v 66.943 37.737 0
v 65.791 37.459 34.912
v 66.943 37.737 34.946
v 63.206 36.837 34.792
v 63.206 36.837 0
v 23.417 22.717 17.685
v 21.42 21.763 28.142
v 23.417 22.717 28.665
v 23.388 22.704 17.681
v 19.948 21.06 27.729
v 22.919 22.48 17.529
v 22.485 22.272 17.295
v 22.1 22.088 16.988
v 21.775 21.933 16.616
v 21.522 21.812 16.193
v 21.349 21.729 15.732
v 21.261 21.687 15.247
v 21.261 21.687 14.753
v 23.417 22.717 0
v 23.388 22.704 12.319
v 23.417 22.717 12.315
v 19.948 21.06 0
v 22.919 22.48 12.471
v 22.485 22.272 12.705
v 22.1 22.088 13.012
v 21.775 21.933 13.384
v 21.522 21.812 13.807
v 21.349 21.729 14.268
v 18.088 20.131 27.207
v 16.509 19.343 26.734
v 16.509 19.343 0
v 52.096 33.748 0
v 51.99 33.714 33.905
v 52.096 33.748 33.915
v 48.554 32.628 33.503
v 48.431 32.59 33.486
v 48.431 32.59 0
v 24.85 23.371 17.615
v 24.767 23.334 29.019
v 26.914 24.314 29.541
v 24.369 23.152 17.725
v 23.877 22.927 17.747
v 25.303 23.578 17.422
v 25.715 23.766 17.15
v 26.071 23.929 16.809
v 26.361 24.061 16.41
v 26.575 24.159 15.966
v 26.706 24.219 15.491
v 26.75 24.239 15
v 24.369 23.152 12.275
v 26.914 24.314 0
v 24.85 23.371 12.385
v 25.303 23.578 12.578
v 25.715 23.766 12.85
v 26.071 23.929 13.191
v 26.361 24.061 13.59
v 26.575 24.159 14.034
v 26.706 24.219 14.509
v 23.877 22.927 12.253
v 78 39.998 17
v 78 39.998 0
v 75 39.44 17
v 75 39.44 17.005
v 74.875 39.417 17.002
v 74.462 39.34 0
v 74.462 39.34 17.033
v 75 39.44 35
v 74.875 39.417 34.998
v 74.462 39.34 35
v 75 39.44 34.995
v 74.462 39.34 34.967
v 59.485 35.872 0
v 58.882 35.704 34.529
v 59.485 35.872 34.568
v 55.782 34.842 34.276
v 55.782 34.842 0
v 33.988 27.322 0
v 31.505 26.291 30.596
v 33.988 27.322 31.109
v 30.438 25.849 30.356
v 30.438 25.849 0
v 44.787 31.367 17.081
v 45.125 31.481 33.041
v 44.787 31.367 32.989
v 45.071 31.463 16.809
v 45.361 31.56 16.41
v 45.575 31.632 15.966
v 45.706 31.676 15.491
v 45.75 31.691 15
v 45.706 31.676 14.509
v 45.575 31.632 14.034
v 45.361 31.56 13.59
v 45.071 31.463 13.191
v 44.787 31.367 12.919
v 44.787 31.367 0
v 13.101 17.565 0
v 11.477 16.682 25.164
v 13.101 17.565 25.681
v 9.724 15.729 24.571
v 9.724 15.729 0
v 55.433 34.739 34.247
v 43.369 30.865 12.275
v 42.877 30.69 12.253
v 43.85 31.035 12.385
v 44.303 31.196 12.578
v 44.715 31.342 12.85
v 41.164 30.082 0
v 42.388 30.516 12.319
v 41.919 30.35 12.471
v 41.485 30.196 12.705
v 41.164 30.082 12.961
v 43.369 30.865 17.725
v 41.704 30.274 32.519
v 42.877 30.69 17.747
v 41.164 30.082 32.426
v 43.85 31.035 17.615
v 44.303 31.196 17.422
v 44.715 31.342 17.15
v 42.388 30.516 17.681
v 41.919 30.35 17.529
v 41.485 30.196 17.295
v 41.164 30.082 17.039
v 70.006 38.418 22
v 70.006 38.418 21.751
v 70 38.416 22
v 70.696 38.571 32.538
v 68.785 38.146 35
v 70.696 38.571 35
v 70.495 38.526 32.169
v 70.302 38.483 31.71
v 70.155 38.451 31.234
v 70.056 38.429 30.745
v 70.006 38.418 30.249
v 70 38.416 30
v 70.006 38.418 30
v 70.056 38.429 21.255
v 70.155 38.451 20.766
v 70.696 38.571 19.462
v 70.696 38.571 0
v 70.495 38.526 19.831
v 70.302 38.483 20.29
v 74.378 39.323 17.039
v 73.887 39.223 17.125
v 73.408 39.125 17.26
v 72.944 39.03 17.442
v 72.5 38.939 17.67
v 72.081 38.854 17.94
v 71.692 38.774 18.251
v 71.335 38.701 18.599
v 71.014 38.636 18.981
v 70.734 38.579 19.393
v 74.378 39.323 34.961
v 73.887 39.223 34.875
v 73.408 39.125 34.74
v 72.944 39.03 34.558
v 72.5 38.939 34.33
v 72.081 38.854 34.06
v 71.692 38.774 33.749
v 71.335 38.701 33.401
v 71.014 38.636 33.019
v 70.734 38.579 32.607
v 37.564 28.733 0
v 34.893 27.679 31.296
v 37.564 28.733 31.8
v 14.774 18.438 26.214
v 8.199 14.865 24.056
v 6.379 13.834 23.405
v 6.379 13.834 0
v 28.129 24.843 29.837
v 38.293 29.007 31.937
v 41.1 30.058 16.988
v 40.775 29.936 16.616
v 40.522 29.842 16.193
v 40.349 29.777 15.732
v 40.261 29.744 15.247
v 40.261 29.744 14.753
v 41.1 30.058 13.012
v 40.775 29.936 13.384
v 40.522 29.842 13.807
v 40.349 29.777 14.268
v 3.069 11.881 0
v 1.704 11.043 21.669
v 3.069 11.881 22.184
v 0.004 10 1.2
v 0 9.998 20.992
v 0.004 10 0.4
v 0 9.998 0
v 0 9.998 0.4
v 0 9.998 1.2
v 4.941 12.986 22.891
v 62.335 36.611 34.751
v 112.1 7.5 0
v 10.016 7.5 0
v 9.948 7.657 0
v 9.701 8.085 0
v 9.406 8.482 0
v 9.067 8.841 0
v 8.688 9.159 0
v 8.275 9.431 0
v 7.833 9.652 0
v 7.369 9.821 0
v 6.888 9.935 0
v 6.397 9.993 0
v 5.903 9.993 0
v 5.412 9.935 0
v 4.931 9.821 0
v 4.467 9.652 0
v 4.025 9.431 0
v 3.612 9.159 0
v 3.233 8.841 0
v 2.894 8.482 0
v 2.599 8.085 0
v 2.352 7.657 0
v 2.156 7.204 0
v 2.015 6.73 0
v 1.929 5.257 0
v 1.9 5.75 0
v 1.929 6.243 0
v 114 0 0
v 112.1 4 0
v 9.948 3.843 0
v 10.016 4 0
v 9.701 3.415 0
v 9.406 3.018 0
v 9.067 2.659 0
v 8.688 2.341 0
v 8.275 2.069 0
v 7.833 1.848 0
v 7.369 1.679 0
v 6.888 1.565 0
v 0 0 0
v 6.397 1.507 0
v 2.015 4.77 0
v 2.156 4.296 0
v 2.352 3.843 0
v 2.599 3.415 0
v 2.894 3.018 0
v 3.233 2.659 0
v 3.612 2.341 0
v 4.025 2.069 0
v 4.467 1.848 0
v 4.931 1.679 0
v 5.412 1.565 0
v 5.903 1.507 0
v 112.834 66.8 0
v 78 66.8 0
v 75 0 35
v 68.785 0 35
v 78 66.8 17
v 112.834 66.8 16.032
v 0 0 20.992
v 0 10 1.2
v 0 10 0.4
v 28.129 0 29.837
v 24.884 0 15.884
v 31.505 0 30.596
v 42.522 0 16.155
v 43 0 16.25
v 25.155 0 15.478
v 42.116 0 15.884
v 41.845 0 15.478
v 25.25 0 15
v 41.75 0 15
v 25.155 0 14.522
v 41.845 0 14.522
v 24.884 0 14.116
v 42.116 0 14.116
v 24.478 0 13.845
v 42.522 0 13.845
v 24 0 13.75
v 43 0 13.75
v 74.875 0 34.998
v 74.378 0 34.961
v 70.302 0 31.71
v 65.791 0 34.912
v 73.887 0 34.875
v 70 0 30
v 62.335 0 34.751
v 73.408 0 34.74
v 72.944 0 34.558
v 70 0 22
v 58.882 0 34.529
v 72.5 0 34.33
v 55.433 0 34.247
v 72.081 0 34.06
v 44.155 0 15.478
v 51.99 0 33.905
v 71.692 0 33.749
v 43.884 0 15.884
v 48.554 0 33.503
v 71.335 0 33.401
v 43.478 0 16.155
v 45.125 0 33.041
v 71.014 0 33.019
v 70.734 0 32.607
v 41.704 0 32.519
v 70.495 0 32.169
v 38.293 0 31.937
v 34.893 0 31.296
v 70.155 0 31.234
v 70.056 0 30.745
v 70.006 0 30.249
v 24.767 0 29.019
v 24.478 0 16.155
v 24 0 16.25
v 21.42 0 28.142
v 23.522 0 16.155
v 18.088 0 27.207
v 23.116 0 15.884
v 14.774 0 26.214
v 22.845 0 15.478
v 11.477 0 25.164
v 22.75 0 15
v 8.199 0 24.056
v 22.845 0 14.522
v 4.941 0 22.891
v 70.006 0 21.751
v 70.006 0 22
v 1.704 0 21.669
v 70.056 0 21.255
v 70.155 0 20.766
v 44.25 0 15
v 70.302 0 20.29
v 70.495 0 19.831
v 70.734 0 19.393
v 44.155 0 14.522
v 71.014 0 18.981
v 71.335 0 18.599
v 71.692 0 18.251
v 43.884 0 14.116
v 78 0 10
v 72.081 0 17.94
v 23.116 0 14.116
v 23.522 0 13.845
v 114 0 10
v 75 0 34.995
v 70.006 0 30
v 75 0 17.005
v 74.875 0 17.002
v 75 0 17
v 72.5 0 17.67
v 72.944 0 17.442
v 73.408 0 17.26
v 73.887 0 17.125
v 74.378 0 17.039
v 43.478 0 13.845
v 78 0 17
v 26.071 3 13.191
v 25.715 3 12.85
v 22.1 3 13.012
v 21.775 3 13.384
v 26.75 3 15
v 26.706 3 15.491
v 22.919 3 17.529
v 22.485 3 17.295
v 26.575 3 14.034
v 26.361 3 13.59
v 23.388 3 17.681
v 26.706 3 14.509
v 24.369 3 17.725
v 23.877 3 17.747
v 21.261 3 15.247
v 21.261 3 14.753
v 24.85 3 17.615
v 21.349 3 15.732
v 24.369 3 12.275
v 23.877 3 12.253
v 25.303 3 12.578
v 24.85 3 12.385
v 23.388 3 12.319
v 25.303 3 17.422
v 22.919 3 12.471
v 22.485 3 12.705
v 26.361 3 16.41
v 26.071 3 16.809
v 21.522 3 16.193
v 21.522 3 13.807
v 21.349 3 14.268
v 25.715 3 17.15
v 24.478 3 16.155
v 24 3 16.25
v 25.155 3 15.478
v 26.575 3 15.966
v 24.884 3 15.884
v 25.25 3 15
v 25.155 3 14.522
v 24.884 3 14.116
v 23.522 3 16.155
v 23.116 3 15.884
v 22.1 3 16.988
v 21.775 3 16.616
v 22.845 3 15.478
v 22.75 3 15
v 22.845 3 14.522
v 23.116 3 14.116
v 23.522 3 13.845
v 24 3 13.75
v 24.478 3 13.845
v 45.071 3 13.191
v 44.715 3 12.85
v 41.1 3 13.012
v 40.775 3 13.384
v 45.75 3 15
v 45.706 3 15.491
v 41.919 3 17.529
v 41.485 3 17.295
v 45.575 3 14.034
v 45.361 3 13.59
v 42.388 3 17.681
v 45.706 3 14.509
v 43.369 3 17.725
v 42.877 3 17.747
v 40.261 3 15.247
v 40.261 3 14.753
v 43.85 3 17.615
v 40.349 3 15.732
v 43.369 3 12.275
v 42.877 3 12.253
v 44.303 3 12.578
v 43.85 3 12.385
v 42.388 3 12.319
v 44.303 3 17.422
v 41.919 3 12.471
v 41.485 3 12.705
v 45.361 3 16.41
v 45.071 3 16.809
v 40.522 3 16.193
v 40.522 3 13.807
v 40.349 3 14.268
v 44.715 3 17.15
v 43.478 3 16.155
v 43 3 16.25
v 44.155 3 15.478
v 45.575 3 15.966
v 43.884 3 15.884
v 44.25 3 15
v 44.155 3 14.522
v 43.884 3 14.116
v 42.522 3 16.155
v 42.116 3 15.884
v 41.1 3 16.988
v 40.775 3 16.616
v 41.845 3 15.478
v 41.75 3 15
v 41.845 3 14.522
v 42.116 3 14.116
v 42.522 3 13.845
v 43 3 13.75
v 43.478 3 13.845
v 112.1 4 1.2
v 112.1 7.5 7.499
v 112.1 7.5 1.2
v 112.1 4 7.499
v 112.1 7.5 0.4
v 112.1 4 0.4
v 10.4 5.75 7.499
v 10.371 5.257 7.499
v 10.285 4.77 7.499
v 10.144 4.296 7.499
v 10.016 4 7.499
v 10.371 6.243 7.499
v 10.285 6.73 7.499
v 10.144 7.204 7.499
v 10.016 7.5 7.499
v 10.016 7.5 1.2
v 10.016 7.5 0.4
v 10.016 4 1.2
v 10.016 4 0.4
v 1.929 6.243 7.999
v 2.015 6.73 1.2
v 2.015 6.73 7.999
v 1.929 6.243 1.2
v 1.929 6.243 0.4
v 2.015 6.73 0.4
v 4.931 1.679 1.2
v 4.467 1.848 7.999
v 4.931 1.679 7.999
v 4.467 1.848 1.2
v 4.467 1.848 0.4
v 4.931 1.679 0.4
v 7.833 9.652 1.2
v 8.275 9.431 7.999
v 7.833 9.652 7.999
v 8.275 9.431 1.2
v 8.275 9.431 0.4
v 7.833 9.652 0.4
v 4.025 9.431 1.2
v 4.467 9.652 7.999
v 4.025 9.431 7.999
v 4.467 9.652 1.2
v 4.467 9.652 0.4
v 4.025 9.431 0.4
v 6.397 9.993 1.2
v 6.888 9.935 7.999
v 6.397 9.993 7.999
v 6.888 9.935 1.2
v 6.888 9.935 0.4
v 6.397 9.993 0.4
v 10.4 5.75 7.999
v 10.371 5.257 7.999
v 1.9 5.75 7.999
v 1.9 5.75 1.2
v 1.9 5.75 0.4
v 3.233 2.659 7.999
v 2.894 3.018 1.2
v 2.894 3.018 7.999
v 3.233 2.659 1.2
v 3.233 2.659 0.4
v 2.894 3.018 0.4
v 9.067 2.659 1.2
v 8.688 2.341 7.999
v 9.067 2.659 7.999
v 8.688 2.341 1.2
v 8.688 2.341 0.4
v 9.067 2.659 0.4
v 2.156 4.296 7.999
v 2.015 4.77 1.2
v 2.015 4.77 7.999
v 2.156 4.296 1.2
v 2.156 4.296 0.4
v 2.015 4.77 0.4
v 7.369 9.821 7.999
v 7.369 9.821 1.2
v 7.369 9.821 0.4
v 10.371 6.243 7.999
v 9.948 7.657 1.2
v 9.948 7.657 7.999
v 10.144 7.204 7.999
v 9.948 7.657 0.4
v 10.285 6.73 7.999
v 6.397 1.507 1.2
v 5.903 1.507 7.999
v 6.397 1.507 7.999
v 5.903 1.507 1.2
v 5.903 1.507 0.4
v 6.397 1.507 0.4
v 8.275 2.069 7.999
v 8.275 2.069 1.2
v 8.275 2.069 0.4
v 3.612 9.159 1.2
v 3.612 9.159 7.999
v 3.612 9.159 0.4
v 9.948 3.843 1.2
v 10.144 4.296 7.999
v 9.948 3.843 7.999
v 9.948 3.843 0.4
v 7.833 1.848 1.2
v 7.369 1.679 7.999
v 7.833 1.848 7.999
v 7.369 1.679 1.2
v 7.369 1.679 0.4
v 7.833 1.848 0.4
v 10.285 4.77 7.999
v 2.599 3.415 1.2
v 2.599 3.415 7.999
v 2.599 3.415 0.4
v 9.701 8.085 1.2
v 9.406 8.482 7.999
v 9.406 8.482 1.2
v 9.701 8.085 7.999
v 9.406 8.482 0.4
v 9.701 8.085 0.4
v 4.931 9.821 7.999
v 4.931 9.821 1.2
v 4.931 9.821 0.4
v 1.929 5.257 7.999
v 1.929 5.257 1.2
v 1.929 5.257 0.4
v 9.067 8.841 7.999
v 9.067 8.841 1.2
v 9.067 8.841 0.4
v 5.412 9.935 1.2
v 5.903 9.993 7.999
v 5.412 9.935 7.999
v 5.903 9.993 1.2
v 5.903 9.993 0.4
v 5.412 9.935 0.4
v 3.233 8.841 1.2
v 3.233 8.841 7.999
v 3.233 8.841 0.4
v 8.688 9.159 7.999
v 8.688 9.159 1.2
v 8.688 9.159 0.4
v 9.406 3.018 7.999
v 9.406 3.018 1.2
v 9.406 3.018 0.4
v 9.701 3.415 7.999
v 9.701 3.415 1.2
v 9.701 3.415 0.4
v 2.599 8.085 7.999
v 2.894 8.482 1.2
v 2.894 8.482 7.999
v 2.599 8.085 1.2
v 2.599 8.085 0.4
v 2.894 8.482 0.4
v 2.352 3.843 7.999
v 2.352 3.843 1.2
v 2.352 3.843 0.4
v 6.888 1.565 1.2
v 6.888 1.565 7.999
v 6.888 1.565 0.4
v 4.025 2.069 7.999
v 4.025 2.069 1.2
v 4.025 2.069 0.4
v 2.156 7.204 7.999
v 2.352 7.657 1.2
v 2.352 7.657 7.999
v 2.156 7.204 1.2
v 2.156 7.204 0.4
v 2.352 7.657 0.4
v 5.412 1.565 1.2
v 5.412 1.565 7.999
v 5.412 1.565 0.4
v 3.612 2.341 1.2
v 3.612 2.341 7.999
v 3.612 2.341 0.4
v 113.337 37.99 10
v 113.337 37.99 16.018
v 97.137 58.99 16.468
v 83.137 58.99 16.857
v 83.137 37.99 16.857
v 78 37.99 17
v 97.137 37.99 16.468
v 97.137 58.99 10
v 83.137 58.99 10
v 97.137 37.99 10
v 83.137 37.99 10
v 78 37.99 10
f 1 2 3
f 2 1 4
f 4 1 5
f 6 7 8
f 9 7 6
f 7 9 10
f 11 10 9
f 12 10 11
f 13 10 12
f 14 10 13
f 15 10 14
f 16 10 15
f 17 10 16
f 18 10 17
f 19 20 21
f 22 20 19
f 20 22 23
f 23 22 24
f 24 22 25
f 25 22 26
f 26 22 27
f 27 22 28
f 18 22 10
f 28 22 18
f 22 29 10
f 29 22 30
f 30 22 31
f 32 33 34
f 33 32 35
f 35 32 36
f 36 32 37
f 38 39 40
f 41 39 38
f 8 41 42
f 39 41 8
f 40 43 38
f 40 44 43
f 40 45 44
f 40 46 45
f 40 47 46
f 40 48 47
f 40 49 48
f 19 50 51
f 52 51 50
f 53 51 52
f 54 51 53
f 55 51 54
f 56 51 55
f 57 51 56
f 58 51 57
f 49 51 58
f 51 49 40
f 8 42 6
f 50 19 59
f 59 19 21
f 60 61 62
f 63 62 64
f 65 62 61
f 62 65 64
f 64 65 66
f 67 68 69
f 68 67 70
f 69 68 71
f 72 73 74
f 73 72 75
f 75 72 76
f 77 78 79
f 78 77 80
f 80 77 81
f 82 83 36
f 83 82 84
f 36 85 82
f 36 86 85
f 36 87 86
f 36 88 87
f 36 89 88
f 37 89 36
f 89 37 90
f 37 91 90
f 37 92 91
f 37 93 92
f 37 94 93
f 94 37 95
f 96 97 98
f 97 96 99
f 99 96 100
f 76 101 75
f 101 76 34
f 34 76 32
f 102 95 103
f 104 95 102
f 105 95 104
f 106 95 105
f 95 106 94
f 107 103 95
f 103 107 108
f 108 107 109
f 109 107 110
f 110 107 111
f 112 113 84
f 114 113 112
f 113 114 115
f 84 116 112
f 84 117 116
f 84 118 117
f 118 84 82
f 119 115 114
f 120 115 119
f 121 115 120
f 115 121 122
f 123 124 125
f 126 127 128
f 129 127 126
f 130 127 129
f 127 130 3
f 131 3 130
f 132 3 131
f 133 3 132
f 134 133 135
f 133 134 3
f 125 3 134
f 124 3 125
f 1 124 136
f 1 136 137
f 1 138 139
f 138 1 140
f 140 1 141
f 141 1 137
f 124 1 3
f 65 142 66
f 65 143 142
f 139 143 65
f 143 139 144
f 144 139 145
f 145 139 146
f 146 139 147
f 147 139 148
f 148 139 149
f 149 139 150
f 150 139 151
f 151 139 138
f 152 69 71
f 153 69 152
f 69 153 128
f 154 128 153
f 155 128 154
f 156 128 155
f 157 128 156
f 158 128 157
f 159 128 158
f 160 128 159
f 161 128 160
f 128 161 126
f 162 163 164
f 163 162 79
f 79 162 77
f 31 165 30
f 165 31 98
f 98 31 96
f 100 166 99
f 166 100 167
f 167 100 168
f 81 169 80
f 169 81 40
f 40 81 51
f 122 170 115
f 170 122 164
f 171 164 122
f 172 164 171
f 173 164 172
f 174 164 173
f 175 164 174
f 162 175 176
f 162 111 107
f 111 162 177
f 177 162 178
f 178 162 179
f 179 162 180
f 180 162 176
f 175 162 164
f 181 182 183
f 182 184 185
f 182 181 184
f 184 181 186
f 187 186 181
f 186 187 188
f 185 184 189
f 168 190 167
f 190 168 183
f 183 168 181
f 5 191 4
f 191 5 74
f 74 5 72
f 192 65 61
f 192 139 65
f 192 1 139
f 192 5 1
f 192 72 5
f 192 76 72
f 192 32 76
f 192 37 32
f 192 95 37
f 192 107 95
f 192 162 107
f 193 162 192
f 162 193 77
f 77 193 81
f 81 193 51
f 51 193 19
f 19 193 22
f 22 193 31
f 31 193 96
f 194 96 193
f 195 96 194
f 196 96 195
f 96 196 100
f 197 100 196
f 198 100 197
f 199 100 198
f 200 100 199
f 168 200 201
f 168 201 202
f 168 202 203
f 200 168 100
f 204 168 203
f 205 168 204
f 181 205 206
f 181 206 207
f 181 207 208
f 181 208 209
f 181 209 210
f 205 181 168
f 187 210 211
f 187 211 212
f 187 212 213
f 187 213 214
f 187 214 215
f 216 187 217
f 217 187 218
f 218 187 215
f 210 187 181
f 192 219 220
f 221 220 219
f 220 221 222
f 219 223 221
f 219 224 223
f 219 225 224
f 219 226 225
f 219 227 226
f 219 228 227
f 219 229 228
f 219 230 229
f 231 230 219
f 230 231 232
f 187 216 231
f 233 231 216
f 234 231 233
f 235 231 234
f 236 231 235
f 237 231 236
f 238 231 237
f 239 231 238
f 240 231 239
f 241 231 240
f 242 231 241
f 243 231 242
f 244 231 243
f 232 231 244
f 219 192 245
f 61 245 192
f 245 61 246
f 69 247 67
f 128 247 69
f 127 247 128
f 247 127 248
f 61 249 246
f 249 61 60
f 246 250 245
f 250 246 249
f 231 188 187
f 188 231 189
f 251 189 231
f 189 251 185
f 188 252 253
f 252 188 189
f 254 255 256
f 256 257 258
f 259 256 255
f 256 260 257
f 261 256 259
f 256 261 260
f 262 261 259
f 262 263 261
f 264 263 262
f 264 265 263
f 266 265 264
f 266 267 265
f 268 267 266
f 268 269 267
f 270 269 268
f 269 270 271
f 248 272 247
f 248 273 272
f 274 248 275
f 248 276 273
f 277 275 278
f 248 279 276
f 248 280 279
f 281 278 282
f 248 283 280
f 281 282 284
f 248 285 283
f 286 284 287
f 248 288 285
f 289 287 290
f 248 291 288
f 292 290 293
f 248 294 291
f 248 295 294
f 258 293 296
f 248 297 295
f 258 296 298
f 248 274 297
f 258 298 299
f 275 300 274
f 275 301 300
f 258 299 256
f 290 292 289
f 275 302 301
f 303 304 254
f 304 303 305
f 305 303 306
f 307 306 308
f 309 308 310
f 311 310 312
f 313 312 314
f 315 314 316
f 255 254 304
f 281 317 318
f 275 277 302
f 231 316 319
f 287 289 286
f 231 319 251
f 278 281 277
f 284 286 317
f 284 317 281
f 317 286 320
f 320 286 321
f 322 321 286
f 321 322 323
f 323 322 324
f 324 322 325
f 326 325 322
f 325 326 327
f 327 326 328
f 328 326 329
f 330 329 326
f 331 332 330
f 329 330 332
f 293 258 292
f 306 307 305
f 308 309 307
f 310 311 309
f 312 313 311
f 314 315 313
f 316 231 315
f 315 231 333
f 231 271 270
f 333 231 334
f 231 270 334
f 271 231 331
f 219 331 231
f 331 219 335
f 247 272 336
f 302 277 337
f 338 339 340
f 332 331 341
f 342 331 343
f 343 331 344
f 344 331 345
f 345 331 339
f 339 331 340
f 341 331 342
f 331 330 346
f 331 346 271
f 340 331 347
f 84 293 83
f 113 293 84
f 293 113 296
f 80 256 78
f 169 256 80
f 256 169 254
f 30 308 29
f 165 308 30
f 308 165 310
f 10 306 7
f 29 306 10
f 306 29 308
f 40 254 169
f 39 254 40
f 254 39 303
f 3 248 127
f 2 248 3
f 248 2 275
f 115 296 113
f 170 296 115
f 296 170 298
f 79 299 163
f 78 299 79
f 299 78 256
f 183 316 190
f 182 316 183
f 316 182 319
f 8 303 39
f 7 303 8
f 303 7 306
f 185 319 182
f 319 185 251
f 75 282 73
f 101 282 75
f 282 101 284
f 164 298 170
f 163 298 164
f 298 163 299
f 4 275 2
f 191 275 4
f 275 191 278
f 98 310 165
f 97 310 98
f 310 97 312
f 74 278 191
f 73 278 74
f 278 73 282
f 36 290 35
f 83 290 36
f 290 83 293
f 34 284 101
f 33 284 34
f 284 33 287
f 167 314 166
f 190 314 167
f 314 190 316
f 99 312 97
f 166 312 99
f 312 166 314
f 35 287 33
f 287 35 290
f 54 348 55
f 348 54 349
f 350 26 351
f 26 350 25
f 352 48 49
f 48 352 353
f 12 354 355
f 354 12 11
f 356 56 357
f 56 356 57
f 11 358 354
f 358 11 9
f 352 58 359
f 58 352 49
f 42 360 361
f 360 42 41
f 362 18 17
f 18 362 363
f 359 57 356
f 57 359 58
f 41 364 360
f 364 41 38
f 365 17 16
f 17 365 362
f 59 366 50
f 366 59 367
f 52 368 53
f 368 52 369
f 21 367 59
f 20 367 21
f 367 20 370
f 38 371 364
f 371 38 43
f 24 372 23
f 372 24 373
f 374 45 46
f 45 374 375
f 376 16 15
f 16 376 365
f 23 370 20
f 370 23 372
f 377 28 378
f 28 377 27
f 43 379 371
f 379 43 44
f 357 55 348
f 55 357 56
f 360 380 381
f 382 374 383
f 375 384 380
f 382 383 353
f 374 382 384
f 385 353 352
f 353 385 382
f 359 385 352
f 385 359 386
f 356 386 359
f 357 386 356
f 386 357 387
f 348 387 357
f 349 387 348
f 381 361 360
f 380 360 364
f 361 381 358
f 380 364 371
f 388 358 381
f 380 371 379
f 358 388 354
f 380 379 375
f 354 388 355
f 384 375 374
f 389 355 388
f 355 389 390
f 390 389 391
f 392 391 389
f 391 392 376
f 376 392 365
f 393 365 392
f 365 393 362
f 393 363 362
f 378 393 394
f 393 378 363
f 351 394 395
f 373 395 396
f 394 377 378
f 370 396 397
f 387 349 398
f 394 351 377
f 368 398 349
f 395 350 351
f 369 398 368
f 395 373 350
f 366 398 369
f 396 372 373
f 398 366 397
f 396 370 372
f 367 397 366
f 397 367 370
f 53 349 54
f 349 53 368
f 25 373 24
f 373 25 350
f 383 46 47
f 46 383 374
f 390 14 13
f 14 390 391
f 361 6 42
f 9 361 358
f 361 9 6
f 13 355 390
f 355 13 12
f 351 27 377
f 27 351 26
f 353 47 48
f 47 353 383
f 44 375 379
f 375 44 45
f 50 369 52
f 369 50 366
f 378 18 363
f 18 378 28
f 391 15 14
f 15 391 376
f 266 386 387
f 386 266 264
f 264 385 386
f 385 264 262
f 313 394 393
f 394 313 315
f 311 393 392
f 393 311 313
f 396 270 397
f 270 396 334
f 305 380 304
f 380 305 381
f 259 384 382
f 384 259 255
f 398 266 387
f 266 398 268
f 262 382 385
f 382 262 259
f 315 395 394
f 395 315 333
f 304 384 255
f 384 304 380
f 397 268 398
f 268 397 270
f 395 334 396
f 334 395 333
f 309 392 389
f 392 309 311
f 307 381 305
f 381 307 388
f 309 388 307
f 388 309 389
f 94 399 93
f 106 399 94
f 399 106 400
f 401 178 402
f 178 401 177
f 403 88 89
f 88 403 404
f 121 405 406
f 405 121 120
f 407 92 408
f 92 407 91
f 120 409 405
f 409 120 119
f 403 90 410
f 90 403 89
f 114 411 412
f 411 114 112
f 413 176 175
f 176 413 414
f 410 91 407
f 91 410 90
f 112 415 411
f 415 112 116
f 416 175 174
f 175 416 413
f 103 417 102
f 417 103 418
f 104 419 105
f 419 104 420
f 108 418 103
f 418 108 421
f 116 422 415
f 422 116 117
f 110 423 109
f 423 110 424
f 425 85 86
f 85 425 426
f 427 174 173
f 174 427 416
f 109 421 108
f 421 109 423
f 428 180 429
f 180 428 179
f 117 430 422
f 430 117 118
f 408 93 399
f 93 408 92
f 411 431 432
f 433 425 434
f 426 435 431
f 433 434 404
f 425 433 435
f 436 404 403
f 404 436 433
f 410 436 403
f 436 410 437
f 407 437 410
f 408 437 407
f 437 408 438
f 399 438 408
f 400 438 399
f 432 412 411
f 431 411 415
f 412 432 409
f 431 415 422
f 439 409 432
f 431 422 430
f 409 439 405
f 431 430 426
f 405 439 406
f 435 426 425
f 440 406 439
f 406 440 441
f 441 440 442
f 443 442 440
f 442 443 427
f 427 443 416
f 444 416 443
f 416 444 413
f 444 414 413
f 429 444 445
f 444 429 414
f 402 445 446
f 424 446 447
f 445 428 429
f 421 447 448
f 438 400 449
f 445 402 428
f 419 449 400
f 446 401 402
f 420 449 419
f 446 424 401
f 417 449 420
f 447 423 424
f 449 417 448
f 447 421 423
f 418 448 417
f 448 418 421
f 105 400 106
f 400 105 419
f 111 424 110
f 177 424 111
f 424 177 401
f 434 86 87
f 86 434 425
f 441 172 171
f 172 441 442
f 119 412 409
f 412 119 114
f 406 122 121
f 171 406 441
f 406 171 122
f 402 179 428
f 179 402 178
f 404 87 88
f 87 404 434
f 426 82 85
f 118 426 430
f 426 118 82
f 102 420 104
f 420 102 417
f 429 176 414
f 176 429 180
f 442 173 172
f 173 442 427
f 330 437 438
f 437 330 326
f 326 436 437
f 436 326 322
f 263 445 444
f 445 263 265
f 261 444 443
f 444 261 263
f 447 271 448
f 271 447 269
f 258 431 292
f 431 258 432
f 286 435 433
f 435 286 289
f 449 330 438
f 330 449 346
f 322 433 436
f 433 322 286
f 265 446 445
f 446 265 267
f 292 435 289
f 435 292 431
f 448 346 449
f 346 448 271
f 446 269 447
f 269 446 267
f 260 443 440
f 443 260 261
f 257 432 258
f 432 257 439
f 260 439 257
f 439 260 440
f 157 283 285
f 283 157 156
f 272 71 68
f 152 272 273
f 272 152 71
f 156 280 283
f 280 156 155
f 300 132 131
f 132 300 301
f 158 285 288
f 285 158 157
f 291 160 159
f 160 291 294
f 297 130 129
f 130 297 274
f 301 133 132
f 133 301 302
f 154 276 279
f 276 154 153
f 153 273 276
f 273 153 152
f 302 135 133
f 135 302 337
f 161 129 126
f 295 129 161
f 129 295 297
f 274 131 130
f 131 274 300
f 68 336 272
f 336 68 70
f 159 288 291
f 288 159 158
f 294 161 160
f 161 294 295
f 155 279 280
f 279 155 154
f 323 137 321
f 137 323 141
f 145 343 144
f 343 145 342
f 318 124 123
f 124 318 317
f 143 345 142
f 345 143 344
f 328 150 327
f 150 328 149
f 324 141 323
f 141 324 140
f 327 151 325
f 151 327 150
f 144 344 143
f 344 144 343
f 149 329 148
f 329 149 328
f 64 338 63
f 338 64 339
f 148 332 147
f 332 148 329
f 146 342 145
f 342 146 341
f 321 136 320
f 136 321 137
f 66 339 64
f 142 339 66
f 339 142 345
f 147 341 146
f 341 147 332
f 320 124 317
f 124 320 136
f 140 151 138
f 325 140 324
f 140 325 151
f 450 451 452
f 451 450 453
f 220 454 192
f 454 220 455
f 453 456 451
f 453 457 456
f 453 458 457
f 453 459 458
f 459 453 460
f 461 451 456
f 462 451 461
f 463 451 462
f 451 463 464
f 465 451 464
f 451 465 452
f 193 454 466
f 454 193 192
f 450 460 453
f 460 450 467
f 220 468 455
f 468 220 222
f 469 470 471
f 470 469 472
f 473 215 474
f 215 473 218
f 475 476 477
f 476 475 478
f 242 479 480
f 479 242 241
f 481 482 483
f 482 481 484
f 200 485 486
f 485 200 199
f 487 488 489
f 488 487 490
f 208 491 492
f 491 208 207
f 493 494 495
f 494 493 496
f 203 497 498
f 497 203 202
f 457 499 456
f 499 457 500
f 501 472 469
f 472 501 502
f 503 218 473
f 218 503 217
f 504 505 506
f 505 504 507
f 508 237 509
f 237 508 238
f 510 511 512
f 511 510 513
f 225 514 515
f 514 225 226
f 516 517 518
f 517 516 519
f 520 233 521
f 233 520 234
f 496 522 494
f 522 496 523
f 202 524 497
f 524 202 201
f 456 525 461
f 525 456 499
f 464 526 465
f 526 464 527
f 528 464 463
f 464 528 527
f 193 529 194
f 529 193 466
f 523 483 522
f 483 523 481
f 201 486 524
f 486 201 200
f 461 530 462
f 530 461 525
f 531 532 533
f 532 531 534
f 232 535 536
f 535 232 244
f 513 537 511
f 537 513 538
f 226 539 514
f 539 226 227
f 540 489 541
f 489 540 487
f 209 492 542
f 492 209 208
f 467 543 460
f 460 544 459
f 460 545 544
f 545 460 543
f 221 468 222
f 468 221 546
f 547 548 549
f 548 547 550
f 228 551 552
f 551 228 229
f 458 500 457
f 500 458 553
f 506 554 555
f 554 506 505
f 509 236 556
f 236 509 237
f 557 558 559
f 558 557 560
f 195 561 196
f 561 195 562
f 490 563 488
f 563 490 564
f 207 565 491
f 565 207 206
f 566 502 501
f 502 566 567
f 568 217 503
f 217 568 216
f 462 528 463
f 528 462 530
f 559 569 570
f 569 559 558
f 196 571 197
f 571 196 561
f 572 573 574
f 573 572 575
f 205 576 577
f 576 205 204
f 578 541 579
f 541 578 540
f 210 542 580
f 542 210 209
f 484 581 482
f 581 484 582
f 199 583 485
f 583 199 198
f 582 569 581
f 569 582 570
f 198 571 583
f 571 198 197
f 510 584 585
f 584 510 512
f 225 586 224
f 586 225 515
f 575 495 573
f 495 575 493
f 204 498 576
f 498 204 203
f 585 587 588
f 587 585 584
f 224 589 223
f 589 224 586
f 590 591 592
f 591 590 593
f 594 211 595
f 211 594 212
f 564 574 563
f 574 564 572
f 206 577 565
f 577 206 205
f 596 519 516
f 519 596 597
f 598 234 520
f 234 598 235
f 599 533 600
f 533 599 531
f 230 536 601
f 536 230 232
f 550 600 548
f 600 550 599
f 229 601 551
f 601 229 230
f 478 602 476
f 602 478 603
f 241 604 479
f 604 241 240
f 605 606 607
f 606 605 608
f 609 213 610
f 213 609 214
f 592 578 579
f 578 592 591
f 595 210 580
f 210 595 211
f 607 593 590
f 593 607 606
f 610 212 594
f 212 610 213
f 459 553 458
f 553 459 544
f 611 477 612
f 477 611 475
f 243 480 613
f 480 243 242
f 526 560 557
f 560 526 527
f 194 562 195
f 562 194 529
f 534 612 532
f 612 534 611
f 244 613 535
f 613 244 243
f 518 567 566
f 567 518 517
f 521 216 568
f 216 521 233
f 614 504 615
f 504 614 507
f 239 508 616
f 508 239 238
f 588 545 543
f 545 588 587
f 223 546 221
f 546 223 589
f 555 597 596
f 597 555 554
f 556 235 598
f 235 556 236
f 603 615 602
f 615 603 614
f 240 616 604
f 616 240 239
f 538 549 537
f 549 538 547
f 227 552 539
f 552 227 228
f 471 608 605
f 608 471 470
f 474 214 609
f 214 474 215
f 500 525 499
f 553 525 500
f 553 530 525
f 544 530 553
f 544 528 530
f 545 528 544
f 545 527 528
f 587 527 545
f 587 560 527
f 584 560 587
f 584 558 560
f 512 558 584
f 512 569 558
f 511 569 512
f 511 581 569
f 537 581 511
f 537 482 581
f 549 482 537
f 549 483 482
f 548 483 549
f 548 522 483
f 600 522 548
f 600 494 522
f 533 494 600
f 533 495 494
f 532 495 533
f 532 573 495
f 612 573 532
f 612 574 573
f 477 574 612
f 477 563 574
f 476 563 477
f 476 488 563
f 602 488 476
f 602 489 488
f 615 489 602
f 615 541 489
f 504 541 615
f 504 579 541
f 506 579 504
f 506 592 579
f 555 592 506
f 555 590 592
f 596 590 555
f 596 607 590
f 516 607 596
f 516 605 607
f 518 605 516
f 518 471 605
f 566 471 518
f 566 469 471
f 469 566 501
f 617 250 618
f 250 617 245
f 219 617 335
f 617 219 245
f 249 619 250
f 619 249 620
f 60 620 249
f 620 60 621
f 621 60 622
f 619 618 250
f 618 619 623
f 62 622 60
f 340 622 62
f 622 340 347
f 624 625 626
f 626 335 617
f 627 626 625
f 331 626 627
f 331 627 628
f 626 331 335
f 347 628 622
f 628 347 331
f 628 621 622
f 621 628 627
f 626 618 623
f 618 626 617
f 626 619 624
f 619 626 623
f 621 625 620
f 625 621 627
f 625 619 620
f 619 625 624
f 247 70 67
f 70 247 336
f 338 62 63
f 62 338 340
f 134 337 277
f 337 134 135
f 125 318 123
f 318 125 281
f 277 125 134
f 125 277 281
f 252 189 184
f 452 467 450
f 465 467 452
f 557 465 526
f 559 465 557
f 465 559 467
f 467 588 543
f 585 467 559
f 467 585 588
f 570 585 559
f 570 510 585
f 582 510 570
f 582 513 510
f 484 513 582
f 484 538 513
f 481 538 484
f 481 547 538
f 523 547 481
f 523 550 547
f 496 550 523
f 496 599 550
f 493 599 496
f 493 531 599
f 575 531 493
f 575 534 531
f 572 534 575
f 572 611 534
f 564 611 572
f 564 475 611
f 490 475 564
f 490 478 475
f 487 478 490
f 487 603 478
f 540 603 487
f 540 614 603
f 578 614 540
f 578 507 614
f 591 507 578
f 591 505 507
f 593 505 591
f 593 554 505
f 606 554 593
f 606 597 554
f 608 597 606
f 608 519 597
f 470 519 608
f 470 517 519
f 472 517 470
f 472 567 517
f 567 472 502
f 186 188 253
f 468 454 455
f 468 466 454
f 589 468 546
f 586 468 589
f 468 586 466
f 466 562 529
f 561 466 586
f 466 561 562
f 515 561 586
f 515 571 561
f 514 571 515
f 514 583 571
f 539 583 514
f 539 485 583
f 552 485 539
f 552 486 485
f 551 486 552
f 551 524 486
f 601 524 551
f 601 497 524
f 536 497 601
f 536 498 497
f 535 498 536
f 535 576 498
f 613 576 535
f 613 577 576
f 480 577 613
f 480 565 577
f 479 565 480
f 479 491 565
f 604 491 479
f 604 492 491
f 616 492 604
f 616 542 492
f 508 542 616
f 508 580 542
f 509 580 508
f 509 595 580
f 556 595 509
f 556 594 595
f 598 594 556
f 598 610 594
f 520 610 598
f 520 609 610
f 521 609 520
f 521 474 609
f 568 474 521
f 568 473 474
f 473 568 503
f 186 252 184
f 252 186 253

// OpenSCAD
// file: lib/segment.scad
// Circle segment

// Specify cylinder segment by its length (chord) and arc height
// th is the thickness (height of the resulting cylinder)
module cylinder_segment (chord, h, th, keep_cylinder=false)
{
    v = chord / 2;
    r = (v*v + h*h) / (2 * h);
    difference () {
        translate ([0, -(r - h), 0])
            cylinder (r = r, h = th);
        if (!keep_cylinder) {
            translate ([-r, -2 * r, -th])
                cube ([2 * r, 2 * r, 3 * th]);
        }
    }
}

// cut out a segment from a sphere, the part will stand on its tip
module sphere_segment (chord, h, alpha)
{
    v = chord / 2;
    y = - ( sqrt (v*v + cos (alpha) * h) * (pow (v, 5) - pow (h, 4) * v)
          + sqrt (cos (alpha) + 1) * (pow (h, 6) - h*h * pow (v, 4))
          )
        / ( sqrt (2) * h * pow (v, 4)
          + sqrt (2) * cos (alpha) * h*h * v*v
          - sqrt(2) * (cos (alpha) + 1) * pow (h, 5)
          );
    r = sqrt
      ( pow
        ( (-( sqrt (v*v + cos (alpha) * h) * (pow (v, 5) - pow (h, 4) * v)
            + sqrt (cos (alpha) + 1) * (pow (h, 6) - h*h * pow (v, 4))
            )
          / ( sqrt (2) * h * pow (v, 4)
            + sqrt (2) * cos (alpha) * h*h * v*v
            + (-sqrt (2) * cos (alpha) - sqrt(2)) * pow (h, 5)
            )
          - ( sqrt (cos (alpha) + 1) * h) / sqrt (2)
          )
        , 2
        ) + ((1 - cos (alpha)) * h*h) / 2
      );
    difference () {
        translate ([0, 0, y])
            sphere (r = r);
        for (xx = [-1:2:1]) {
            rotate ([0, xx * alpha / 2, 0])
                translate ([xx*2*r, 0, -r + 2*(r+y)])
                    cube (4*r, center = true);
        }
    }
}
// main file
use <lib/segment.scad>

// Fridge part

module fpart
    ( h1=10, h2=21, h3=35
    , w=66.8, w2=10, w3=40, w4=17, w5=16, w6=38, w7=21
    , l=114, l1=78, l2=14, l3=16.2, l4=75
    , sh=4
    , d=8.5, df=3.5, hg=4, t=1.9, tg=7.5, tge=0.5
    , lh1=24, lh2=43, hh=15, hu=3, hd=5.5, hsd=2.5
    , ro=5
    )
{
    chord  = sqrt (l1*l1 + (h3-h2)*(h3-h2));
    alpha  = atan ((h3-h2) / l1);
    chord2 = sqrt (l1*l1 + (w3-w2)*(w3-w2));
    beta   = atan ((w3-w2) / l1);
    gamma  = atan ((w5-w4) / (l-l1));
    l3s    = l3 + w6 * sin (1);

    difference () {
        intersection () {
            cube ([l, w, h3]);
            translate ([0, w, h2])
                rotate ([0, -alpha, 0])
                    translate ([chord/2, 0, 0])
                        rotate ([90, 0, 0])
                            cylinder_segment (chord, sh, w, true);
            union () {
                translate ([0, w2, 0])
                    rotate ([0, 0, beta])
                        translate ([chord2/2, 0, 0])
                            cylinder_segment (chord2, sh, h3, true);
                translate ([l1, 0, 0])
                    cube ([l, w, h3]);
            }
        }
        translate ([2*t, hg, -0.001])
            cube ([l-3*t, df, tg]);
        translate ([d/2 + t, hg + df/2, -0.001])
            cylinder (h=tg+tge, r=d/2);
        // side facing rear is 1° tilted
        translate ([l, 0, 0])
            rotate ([0, 0, 1])
                translate ([0, -w/2, -w/2])
                    cube (2*w);
        // remove mounting space
        translate ([l1, 0, w4])
            rotate ([0, -gamma, 0])
                translate ([0, -w, 0])
                    cube ([2*(l-l1), 3*w, h3]);
        translate ([l1, 0, w4])
            translate ([-0.01, -w, 0])
                cube ([2*(l-l1)+0.01, 3*w, h3]);
            translate ([l1, -0.01, h1])
                cube ([l-l1, w6, h3-h1]);
            translate ([l-l3s-l2, w6-0.02, h1])
                cube ([l2, w7+0.01, h3-h1]);
        // holes for railing
        for (lh = [lh1, lh2]) {
            translate ([lh, 0, hh])
            rotate ([-90, 0, 0])
                union () {
                    translate ([0, 0, hu])
                        cylinder (h=w, r=hd/2);
                    translate ([0, 0, -1])
                        cylinder (h=w, r=hsd/2);
                }
        }
        for (m = [h3-ro, w4+ro]) {
            translate ([l4, -1, m])
                rotate ([-90, 0, 0])
                    cylinder (h=w, r=ro);
        }
        translate ([l4, -1, w4])
            cube ([ro, w, h3-w4+1]);
        translate ([l4-ro, -1, w4+ro])
            cube ([ro, w, h3-w4-2*ro]);
    }
    // support for printing
    translate ([0, 0, 0.4])
        cube ([l-t, d/2 + hg + df/2, 0.8]);
}

fpart ($fa = 1, $fs = .5);
